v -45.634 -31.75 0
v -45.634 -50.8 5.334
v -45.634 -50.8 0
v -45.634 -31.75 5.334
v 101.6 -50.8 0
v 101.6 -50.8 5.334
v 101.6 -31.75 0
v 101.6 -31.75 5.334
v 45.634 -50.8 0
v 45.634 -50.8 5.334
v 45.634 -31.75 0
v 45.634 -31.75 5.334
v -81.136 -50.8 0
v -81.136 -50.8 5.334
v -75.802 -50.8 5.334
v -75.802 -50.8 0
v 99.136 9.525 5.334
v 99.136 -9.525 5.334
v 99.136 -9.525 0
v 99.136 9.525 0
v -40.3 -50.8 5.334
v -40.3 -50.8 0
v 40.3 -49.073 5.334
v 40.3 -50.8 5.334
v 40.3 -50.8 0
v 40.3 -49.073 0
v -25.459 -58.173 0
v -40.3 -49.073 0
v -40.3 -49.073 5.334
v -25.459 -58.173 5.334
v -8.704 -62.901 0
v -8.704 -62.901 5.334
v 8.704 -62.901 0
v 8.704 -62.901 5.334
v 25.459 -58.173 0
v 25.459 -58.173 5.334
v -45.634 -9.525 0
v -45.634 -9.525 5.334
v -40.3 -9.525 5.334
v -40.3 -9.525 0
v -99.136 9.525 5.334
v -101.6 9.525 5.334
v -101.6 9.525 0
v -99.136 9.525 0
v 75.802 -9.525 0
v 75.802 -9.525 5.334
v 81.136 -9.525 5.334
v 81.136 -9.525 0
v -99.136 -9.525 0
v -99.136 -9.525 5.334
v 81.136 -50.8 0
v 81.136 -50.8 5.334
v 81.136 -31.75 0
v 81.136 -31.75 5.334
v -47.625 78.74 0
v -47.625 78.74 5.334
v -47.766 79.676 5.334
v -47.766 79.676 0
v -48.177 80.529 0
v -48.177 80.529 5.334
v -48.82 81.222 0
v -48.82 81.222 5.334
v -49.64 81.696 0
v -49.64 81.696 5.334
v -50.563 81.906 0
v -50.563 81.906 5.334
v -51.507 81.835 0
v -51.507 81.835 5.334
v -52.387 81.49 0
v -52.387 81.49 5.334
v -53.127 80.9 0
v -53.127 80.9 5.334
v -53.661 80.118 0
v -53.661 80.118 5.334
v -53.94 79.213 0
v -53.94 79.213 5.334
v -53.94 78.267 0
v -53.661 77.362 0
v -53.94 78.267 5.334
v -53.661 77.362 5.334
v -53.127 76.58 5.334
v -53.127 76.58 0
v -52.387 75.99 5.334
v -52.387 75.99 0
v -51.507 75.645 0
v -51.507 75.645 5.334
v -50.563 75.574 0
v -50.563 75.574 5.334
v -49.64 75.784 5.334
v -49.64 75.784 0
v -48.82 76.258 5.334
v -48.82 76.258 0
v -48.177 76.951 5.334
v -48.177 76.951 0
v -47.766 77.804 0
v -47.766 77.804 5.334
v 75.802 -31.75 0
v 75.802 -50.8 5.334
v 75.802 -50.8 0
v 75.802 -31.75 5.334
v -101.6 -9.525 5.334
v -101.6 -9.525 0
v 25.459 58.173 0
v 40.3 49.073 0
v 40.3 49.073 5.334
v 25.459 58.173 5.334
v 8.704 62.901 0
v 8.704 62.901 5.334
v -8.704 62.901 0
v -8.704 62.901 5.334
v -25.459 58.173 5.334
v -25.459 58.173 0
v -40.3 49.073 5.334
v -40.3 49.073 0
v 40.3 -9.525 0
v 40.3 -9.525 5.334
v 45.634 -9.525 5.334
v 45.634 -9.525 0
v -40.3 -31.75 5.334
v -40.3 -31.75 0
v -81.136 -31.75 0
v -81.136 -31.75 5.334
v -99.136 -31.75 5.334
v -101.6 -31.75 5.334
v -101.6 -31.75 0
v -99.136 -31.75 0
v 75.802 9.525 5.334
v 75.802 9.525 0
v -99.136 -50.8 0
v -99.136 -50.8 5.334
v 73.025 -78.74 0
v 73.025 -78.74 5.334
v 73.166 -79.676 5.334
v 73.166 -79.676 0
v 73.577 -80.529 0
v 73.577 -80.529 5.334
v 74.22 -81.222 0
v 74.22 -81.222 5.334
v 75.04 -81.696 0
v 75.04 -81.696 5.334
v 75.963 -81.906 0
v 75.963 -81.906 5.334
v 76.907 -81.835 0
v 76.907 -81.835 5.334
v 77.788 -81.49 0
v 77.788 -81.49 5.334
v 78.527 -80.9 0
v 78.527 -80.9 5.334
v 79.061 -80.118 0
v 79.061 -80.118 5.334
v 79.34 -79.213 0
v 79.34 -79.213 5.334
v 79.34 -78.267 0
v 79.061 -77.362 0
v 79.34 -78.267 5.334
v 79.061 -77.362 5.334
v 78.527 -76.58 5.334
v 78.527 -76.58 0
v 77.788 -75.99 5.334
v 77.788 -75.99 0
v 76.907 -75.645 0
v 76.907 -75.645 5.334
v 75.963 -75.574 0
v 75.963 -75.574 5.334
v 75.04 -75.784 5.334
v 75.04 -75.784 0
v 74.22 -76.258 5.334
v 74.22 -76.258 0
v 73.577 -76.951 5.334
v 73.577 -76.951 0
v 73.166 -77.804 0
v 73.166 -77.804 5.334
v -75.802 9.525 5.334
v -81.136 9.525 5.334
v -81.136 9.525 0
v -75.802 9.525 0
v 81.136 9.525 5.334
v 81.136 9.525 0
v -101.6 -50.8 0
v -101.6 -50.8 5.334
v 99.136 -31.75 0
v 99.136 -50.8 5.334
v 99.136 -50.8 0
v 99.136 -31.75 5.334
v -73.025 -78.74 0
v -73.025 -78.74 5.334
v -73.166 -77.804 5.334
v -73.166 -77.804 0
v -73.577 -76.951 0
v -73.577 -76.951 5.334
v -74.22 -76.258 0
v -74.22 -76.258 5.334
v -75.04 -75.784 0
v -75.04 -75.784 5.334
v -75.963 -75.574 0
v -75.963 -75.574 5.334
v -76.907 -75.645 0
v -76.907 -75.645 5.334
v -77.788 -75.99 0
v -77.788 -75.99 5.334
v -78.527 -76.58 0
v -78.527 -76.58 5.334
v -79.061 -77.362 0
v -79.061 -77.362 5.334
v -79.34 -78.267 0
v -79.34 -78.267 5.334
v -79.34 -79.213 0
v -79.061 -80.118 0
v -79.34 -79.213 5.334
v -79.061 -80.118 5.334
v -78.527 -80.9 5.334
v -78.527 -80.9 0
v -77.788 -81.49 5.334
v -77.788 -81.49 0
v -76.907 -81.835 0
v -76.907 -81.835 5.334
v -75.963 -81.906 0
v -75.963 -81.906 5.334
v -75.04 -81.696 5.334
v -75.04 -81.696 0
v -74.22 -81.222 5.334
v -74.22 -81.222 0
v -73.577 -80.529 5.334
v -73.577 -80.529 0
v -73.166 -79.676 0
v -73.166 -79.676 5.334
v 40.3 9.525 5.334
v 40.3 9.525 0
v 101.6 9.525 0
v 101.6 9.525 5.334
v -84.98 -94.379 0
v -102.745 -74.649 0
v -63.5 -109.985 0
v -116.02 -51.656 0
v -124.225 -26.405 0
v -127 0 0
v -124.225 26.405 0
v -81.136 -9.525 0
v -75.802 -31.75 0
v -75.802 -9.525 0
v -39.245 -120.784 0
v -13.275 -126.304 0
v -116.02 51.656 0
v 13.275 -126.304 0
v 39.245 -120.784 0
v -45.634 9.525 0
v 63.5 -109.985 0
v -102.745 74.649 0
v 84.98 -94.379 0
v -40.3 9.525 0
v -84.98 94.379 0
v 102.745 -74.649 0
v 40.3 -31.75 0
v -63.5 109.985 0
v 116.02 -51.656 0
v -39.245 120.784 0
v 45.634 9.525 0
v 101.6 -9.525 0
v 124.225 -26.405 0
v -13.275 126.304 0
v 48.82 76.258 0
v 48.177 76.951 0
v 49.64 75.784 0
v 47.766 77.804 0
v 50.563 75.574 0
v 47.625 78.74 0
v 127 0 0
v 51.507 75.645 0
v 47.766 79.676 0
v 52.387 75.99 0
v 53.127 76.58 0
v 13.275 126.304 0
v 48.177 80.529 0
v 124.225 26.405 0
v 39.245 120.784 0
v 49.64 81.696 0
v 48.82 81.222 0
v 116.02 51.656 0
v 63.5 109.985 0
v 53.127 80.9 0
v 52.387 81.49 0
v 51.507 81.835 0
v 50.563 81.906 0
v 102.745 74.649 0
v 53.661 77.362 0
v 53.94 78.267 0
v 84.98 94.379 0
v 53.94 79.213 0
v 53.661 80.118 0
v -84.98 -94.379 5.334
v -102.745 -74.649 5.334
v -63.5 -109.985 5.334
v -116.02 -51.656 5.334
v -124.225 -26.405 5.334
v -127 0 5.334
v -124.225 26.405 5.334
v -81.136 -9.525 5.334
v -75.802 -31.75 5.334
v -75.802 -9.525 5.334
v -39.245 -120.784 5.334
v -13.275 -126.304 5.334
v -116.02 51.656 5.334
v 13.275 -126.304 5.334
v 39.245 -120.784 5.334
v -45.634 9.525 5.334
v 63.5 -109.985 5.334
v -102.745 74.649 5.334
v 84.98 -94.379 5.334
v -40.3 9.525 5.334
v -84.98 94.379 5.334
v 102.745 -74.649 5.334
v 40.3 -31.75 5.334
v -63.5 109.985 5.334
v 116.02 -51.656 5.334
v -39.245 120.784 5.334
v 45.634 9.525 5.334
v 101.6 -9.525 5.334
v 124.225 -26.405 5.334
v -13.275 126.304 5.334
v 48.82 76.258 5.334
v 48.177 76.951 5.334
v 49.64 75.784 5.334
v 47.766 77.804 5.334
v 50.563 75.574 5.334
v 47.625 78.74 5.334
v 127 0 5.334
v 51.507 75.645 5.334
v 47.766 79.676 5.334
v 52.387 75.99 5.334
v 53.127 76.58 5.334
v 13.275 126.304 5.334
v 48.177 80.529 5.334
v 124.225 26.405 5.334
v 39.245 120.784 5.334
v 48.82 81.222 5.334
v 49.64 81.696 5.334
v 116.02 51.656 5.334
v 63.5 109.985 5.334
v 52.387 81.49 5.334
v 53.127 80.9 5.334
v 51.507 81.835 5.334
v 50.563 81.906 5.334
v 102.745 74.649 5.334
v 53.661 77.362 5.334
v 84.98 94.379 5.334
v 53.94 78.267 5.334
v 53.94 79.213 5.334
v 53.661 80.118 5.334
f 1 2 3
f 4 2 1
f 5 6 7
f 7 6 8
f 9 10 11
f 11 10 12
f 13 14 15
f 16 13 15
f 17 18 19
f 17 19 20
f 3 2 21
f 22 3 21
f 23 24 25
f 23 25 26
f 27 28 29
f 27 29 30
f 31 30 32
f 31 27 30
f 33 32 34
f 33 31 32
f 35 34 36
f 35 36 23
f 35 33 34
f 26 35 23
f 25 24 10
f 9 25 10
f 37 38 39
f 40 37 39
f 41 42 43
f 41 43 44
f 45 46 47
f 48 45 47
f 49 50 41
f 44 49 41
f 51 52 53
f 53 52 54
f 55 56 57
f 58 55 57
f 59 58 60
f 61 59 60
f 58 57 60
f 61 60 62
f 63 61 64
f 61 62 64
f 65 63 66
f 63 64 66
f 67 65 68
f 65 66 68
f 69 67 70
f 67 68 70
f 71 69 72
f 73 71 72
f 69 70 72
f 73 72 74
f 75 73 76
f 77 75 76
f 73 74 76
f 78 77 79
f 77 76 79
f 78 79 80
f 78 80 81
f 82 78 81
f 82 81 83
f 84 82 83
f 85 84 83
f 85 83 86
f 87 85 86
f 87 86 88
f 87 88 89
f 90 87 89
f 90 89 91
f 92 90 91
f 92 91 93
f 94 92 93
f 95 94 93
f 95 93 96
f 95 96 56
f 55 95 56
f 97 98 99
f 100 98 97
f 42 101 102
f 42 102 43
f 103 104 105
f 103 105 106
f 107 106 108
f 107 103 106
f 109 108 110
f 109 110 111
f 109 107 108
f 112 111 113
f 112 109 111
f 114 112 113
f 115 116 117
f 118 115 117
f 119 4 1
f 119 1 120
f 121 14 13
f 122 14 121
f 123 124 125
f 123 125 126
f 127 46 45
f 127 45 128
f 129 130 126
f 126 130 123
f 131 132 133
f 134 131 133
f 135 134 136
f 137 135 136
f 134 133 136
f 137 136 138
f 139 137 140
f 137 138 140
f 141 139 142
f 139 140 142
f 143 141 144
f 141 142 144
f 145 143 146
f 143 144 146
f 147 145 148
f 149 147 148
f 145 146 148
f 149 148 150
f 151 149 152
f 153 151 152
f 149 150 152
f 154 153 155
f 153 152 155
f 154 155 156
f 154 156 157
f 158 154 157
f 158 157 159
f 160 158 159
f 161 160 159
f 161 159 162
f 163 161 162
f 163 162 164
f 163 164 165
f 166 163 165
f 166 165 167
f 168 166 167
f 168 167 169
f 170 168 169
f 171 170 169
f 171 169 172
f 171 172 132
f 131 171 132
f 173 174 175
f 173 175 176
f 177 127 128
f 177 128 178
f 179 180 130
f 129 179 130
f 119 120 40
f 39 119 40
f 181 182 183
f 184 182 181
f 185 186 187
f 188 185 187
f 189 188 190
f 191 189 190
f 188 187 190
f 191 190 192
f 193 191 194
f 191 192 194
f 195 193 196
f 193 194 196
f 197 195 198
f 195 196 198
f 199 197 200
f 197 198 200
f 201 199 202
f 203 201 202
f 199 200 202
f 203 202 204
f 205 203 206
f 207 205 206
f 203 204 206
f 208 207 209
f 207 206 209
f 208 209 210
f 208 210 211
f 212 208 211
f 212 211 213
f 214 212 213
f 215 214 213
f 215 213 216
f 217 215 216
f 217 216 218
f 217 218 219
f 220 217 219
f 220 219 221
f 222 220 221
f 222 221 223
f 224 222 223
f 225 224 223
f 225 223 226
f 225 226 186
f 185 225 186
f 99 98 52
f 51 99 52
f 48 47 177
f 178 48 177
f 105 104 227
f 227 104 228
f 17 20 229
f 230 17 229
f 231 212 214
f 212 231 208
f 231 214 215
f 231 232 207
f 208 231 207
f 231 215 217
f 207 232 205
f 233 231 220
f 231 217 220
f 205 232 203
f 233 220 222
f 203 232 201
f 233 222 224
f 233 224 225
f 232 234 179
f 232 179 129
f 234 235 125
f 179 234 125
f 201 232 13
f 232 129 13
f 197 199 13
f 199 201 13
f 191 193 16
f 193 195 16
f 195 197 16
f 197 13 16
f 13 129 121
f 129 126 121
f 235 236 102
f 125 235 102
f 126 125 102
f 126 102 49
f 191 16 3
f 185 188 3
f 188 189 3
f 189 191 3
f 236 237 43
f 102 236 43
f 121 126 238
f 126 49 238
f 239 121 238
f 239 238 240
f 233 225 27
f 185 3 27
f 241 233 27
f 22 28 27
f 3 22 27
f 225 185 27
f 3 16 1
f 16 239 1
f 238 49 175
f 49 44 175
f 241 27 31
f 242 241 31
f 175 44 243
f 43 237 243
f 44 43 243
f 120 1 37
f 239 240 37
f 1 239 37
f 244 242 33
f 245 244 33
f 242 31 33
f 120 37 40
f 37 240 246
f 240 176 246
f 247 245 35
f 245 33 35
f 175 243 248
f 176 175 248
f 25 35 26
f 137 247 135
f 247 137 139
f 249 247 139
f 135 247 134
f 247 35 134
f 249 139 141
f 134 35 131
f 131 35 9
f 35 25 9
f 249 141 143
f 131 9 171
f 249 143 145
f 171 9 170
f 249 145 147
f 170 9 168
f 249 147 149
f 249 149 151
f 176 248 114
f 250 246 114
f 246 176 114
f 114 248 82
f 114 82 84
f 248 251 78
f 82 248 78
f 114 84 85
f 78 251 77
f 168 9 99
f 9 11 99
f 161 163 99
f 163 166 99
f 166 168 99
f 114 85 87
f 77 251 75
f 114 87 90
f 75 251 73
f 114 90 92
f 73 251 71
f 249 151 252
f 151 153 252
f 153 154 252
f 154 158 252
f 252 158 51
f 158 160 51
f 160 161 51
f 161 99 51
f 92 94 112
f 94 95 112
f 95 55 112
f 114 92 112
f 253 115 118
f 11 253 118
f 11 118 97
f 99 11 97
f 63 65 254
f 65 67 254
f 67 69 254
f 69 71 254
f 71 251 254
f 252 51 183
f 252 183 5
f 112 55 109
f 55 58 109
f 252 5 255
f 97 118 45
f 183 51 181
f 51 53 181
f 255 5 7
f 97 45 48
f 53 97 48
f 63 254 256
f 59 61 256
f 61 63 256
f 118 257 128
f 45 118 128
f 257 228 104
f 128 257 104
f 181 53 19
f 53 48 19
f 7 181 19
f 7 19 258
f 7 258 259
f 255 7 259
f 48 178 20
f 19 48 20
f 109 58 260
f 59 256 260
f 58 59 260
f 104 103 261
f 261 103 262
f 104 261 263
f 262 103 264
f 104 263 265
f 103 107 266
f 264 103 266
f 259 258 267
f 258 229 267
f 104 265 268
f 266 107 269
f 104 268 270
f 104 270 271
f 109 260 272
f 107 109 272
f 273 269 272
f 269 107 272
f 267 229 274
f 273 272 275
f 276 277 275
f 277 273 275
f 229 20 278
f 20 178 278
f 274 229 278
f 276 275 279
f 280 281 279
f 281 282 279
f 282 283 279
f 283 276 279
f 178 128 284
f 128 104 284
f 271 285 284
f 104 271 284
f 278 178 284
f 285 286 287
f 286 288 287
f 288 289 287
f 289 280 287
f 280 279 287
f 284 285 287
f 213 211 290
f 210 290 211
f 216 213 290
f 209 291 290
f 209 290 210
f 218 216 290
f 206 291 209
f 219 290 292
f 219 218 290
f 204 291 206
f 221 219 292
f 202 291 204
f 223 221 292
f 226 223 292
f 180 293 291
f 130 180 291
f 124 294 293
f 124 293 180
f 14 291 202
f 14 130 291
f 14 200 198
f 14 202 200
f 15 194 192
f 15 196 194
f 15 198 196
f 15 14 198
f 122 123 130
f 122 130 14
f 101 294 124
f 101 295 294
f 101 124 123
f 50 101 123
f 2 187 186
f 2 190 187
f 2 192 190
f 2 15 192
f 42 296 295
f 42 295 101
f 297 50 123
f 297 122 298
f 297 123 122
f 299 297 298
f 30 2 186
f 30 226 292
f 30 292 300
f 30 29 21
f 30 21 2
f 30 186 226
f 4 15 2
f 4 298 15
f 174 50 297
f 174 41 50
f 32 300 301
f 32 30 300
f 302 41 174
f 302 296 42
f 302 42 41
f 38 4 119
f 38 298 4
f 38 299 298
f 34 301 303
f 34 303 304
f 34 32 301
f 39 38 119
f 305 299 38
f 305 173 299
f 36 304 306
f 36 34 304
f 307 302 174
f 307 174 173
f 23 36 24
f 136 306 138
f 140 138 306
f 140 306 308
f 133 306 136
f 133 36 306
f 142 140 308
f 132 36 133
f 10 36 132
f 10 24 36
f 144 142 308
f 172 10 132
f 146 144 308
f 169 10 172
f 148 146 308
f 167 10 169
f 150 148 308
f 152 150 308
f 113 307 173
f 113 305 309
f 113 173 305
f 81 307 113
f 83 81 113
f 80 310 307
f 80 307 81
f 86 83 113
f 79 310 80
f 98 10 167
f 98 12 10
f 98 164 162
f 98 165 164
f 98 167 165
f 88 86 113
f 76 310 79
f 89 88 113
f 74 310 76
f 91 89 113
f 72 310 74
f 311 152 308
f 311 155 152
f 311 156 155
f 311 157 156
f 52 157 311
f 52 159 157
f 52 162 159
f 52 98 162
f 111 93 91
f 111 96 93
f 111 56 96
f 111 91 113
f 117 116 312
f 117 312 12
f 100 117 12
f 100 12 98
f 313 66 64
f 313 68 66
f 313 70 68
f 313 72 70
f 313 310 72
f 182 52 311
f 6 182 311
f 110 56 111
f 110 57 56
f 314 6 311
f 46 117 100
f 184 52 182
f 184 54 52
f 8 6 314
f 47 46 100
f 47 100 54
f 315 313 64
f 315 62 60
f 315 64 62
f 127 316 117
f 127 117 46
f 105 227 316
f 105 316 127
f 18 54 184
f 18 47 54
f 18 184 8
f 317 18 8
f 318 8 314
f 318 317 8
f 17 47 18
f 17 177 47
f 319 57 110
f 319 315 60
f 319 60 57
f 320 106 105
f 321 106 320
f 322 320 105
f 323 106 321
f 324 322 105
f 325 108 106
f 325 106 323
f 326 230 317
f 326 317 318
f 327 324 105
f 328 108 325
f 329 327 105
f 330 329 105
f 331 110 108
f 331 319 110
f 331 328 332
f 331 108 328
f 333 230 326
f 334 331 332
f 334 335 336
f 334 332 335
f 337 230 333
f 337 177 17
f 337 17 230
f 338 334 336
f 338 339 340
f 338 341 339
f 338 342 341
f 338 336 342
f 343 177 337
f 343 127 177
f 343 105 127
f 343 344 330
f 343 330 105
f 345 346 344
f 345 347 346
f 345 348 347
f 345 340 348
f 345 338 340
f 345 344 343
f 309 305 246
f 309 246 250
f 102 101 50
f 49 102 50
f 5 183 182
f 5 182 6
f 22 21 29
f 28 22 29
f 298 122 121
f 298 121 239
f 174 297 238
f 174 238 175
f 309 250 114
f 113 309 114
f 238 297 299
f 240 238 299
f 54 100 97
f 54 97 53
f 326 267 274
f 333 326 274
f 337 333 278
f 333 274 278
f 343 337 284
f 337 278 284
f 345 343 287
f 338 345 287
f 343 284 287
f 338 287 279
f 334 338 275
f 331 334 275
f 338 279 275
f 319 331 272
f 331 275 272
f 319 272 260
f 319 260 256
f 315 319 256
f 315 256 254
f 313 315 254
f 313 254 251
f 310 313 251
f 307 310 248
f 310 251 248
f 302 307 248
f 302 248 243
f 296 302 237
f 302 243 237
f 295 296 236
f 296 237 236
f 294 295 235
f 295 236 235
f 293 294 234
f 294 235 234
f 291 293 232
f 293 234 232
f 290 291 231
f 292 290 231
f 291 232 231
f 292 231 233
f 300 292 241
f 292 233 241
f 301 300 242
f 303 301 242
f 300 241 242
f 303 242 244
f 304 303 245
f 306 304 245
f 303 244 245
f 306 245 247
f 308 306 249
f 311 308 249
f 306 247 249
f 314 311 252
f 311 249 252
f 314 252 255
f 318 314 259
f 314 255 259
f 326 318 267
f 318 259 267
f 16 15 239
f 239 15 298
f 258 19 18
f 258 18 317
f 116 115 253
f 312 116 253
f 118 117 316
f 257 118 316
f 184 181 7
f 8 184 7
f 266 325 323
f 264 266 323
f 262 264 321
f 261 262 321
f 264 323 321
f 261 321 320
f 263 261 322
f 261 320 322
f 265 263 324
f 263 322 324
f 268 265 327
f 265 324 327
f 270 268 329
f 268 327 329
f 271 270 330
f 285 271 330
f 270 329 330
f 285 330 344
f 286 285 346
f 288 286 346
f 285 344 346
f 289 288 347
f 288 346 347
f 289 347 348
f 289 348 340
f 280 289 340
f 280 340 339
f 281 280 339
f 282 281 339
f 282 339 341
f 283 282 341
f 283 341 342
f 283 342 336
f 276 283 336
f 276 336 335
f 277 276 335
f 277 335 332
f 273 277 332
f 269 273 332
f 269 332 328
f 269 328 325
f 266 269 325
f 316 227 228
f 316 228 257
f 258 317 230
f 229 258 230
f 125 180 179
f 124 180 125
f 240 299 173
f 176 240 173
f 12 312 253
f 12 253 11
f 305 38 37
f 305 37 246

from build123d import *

# Parameters (mm, degrees)
SKETCH1_R           = 127
SKETCH1_R_2         = 63.5
BOSS_EXTRUDE1_DEPTH = 5.334
SKETCH14_R          = 3.175
BOLTHOLES_DEPTH     = 180.684310823
SKETCH15_W          = 2.4638
SKETCH15_H          = 19.05
SKETCH15_W_2        = 5.334
MOTORMOUNTS_DEPTH   = 180.684310823


with BuildPart() as part:
    # Sketch1 → Boss-Extrude1 (new body)
    # profile 1 of 3: a face of its own
    with BuildSketch(Plane.XY):
        Circle(SKETCH1_R)
        Circle(SKETCH1_R_2, mode=Mode.SUBTRACT)
    # profile 2 of 3: a face of its own
    with BuildSketch(Plane.XY):
        with BuildLine():
            Line((-40.299999918, -49.073006904), (-40.299999918, 49.073006904))
            ThreePointArc((-40.299999918, 49.073006904), (-63.5, 0), (-40.299999918, -49.073006904))
        make_face()
    # profile 3 of 3: a face of its own
    with BuildSketch(Plane.XY):
        with BuildLine():
            ThreePointArc((63.5, 0), (57.407752067, 27.140375874), (40.299999918, 49.073006904))
            Line((40.299999918, 49.073006904), (40.299999918, -49.073006904))
            ThreePointArc((40.299999918, -49.073006904), (57.407752067, -27.140375874), (63.5, 0))
        make_face()
    extrude(amount=BOSS_EXTRUDE1_DEPTH)

    # Sketch14 → BoltHoles (cut, through all)
    with BuildSketch(Plane.XY.offset(5.334)):
        with Locations((-76.2, -78.74)):
            Circle(SKETCH14_R)
        with Locations((-50.8, 78.74)):
            Circle(SKETCH14_R)
        with Locations(Location((76.2, -78.74, 0), (0, 0, 180))):
            Circle(SKETCH14_R)
        with Locations(Location((50.8, 78.74, 0), (0, 0, 180))):
            Circle(SKETCH14_R)
    extrude(amount=-BOLTHOLES_DEPTH, mode=Mode.SUBTRACT)

    # Sketch15 → MotorMounts (cut, through all)
    with BuildSketch(Plane.XY.offset(5.334)):
        with Locations((-100.3681, -41.275)):
            Rectangle(SKETCH15_W, SKETCH15_H)
        with Locations((-100.3681, 0)):
            Rectangle(SKETCH15_W, SKETCH15_H)
        with Locations((-78.469199932, -41.275)):
            Rectangle(SKETCH15_W_2, SKETCH15_H)
        with Locations((-42.966999918, -41.275)):
            Rectangle(SKETCH15_W_2, SKETCH15_H)
        with Locations((-78.469199932, 0)):
            Rectangle(SKETCH15_W_2, SKETCH15_H)
        with Locations((42.966999918, 0)):
            Rectangle(SKETCH15_W_2, SKETCH15_H)
        with Locations((42.966999918, -41.275)):
            Rectangle(SKETCH15_W_2, SKETCH15_H)
        with Locations((78.469199932, 0)):
            Rectangle(SKETCH15_W_2, SKETCH15_H)
        with Locations((100.3681, 0)):
            Rectangle(SKETCH15_W, SKETCH15_H)
        with Locations((-42.966999918, 0)):
            Rectangle(SKETCH15_W_2, SKETCH15_H)
        with Locations((78.469199932, -41.275)):
            Rectangle(SKETCH15_W_2, SKETCH15_H)
        with Locations((100.3681, -41.275)):
            Rectangle(SKETCH15_W, SKETCH15_H)
    extrude(amount=-MOTORMOUNTS_DEPTH, mode=Mode.SUBTRACT)


solid = part.part
